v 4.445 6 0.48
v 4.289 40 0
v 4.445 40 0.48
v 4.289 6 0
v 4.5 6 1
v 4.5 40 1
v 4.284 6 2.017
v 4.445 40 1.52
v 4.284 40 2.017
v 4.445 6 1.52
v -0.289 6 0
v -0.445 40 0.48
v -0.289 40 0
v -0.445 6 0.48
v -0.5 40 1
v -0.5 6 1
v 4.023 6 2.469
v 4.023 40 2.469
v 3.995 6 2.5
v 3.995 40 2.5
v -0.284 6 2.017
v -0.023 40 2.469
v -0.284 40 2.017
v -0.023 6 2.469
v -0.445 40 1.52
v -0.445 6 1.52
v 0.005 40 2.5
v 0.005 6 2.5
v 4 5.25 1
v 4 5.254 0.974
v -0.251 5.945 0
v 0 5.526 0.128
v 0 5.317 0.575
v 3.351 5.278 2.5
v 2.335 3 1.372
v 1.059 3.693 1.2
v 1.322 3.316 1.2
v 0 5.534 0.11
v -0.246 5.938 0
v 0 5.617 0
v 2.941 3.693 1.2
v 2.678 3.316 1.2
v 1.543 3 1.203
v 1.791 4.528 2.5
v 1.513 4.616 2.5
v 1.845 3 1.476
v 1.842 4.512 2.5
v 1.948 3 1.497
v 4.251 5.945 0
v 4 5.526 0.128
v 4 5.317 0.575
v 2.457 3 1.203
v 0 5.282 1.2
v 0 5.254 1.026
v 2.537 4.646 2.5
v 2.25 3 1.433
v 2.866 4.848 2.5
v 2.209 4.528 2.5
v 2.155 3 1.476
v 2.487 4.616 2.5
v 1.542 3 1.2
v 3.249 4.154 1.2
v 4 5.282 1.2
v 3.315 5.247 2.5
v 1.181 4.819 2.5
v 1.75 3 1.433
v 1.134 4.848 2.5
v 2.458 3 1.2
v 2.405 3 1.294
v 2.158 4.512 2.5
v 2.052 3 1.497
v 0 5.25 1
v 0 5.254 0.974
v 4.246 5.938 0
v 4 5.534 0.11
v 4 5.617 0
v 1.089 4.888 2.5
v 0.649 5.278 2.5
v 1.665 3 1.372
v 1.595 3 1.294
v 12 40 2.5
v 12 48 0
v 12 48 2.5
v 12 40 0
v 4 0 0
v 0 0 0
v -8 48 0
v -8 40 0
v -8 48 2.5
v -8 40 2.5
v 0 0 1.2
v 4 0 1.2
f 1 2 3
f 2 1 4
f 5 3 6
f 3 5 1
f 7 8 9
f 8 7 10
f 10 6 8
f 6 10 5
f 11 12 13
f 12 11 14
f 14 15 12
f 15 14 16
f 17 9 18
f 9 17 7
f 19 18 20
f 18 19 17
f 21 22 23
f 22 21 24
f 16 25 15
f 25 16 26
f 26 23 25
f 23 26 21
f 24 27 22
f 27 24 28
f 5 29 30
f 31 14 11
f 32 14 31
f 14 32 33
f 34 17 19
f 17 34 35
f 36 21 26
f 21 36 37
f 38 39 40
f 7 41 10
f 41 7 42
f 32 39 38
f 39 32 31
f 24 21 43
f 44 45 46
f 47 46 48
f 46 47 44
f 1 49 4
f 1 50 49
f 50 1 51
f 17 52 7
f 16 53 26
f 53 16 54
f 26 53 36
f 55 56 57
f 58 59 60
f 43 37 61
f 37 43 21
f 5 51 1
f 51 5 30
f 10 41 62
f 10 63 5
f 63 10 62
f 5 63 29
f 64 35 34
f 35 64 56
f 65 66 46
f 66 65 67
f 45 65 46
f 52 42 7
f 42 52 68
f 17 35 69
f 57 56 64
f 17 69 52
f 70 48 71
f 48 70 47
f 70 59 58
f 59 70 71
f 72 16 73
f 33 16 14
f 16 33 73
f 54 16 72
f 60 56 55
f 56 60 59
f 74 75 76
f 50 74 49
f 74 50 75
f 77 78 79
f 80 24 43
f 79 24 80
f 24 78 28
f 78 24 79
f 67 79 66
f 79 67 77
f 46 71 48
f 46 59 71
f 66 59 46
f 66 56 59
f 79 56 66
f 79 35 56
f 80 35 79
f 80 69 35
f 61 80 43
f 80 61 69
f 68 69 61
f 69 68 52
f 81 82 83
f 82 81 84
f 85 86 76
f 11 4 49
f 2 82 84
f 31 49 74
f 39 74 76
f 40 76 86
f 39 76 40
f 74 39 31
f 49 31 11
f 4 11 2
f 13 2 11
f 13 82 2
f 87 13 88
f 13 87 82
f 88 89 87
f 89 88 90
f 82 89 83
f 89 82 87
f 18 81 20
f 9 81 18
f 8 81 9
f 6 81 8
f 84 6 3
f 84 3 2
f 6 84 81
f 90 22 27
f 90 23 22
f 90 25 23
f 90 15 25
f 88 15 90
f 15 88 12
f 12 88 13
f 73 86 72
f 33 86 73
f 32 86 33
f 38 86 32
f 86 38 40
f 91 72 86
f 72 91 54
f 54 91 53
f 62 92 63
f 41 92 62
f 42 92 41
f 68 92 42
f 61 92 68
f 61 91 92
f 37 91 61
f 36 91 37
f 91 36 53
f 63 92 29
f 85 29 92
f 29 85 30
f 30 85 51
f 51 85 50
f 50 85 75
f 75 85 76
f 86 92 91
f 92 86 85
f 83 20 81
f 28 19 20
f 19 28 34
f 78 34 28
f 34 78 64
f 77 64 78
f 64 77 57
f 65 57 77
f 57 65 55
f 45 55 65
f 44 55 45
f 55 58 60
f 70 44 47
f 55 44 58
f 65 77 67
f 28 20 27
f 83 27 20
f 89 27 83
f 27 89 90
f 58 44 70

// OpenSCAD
intersection() {
  translate([-50,-50]) cube([100,100,2.5]);
  union(){
  translate([2,6,1]) rotate([-90,0]) cylinder(d=5,h=36,$fn=30);
    translate([2,3,1]) rotate([-90,0]) cylinder(d1=1,d2=5,h=3,$fn=30);
  translate([-8,40]) cube([20,8,3.5]);
linear_extrude(1.2) {
  square([4,16]);
}
}
}
